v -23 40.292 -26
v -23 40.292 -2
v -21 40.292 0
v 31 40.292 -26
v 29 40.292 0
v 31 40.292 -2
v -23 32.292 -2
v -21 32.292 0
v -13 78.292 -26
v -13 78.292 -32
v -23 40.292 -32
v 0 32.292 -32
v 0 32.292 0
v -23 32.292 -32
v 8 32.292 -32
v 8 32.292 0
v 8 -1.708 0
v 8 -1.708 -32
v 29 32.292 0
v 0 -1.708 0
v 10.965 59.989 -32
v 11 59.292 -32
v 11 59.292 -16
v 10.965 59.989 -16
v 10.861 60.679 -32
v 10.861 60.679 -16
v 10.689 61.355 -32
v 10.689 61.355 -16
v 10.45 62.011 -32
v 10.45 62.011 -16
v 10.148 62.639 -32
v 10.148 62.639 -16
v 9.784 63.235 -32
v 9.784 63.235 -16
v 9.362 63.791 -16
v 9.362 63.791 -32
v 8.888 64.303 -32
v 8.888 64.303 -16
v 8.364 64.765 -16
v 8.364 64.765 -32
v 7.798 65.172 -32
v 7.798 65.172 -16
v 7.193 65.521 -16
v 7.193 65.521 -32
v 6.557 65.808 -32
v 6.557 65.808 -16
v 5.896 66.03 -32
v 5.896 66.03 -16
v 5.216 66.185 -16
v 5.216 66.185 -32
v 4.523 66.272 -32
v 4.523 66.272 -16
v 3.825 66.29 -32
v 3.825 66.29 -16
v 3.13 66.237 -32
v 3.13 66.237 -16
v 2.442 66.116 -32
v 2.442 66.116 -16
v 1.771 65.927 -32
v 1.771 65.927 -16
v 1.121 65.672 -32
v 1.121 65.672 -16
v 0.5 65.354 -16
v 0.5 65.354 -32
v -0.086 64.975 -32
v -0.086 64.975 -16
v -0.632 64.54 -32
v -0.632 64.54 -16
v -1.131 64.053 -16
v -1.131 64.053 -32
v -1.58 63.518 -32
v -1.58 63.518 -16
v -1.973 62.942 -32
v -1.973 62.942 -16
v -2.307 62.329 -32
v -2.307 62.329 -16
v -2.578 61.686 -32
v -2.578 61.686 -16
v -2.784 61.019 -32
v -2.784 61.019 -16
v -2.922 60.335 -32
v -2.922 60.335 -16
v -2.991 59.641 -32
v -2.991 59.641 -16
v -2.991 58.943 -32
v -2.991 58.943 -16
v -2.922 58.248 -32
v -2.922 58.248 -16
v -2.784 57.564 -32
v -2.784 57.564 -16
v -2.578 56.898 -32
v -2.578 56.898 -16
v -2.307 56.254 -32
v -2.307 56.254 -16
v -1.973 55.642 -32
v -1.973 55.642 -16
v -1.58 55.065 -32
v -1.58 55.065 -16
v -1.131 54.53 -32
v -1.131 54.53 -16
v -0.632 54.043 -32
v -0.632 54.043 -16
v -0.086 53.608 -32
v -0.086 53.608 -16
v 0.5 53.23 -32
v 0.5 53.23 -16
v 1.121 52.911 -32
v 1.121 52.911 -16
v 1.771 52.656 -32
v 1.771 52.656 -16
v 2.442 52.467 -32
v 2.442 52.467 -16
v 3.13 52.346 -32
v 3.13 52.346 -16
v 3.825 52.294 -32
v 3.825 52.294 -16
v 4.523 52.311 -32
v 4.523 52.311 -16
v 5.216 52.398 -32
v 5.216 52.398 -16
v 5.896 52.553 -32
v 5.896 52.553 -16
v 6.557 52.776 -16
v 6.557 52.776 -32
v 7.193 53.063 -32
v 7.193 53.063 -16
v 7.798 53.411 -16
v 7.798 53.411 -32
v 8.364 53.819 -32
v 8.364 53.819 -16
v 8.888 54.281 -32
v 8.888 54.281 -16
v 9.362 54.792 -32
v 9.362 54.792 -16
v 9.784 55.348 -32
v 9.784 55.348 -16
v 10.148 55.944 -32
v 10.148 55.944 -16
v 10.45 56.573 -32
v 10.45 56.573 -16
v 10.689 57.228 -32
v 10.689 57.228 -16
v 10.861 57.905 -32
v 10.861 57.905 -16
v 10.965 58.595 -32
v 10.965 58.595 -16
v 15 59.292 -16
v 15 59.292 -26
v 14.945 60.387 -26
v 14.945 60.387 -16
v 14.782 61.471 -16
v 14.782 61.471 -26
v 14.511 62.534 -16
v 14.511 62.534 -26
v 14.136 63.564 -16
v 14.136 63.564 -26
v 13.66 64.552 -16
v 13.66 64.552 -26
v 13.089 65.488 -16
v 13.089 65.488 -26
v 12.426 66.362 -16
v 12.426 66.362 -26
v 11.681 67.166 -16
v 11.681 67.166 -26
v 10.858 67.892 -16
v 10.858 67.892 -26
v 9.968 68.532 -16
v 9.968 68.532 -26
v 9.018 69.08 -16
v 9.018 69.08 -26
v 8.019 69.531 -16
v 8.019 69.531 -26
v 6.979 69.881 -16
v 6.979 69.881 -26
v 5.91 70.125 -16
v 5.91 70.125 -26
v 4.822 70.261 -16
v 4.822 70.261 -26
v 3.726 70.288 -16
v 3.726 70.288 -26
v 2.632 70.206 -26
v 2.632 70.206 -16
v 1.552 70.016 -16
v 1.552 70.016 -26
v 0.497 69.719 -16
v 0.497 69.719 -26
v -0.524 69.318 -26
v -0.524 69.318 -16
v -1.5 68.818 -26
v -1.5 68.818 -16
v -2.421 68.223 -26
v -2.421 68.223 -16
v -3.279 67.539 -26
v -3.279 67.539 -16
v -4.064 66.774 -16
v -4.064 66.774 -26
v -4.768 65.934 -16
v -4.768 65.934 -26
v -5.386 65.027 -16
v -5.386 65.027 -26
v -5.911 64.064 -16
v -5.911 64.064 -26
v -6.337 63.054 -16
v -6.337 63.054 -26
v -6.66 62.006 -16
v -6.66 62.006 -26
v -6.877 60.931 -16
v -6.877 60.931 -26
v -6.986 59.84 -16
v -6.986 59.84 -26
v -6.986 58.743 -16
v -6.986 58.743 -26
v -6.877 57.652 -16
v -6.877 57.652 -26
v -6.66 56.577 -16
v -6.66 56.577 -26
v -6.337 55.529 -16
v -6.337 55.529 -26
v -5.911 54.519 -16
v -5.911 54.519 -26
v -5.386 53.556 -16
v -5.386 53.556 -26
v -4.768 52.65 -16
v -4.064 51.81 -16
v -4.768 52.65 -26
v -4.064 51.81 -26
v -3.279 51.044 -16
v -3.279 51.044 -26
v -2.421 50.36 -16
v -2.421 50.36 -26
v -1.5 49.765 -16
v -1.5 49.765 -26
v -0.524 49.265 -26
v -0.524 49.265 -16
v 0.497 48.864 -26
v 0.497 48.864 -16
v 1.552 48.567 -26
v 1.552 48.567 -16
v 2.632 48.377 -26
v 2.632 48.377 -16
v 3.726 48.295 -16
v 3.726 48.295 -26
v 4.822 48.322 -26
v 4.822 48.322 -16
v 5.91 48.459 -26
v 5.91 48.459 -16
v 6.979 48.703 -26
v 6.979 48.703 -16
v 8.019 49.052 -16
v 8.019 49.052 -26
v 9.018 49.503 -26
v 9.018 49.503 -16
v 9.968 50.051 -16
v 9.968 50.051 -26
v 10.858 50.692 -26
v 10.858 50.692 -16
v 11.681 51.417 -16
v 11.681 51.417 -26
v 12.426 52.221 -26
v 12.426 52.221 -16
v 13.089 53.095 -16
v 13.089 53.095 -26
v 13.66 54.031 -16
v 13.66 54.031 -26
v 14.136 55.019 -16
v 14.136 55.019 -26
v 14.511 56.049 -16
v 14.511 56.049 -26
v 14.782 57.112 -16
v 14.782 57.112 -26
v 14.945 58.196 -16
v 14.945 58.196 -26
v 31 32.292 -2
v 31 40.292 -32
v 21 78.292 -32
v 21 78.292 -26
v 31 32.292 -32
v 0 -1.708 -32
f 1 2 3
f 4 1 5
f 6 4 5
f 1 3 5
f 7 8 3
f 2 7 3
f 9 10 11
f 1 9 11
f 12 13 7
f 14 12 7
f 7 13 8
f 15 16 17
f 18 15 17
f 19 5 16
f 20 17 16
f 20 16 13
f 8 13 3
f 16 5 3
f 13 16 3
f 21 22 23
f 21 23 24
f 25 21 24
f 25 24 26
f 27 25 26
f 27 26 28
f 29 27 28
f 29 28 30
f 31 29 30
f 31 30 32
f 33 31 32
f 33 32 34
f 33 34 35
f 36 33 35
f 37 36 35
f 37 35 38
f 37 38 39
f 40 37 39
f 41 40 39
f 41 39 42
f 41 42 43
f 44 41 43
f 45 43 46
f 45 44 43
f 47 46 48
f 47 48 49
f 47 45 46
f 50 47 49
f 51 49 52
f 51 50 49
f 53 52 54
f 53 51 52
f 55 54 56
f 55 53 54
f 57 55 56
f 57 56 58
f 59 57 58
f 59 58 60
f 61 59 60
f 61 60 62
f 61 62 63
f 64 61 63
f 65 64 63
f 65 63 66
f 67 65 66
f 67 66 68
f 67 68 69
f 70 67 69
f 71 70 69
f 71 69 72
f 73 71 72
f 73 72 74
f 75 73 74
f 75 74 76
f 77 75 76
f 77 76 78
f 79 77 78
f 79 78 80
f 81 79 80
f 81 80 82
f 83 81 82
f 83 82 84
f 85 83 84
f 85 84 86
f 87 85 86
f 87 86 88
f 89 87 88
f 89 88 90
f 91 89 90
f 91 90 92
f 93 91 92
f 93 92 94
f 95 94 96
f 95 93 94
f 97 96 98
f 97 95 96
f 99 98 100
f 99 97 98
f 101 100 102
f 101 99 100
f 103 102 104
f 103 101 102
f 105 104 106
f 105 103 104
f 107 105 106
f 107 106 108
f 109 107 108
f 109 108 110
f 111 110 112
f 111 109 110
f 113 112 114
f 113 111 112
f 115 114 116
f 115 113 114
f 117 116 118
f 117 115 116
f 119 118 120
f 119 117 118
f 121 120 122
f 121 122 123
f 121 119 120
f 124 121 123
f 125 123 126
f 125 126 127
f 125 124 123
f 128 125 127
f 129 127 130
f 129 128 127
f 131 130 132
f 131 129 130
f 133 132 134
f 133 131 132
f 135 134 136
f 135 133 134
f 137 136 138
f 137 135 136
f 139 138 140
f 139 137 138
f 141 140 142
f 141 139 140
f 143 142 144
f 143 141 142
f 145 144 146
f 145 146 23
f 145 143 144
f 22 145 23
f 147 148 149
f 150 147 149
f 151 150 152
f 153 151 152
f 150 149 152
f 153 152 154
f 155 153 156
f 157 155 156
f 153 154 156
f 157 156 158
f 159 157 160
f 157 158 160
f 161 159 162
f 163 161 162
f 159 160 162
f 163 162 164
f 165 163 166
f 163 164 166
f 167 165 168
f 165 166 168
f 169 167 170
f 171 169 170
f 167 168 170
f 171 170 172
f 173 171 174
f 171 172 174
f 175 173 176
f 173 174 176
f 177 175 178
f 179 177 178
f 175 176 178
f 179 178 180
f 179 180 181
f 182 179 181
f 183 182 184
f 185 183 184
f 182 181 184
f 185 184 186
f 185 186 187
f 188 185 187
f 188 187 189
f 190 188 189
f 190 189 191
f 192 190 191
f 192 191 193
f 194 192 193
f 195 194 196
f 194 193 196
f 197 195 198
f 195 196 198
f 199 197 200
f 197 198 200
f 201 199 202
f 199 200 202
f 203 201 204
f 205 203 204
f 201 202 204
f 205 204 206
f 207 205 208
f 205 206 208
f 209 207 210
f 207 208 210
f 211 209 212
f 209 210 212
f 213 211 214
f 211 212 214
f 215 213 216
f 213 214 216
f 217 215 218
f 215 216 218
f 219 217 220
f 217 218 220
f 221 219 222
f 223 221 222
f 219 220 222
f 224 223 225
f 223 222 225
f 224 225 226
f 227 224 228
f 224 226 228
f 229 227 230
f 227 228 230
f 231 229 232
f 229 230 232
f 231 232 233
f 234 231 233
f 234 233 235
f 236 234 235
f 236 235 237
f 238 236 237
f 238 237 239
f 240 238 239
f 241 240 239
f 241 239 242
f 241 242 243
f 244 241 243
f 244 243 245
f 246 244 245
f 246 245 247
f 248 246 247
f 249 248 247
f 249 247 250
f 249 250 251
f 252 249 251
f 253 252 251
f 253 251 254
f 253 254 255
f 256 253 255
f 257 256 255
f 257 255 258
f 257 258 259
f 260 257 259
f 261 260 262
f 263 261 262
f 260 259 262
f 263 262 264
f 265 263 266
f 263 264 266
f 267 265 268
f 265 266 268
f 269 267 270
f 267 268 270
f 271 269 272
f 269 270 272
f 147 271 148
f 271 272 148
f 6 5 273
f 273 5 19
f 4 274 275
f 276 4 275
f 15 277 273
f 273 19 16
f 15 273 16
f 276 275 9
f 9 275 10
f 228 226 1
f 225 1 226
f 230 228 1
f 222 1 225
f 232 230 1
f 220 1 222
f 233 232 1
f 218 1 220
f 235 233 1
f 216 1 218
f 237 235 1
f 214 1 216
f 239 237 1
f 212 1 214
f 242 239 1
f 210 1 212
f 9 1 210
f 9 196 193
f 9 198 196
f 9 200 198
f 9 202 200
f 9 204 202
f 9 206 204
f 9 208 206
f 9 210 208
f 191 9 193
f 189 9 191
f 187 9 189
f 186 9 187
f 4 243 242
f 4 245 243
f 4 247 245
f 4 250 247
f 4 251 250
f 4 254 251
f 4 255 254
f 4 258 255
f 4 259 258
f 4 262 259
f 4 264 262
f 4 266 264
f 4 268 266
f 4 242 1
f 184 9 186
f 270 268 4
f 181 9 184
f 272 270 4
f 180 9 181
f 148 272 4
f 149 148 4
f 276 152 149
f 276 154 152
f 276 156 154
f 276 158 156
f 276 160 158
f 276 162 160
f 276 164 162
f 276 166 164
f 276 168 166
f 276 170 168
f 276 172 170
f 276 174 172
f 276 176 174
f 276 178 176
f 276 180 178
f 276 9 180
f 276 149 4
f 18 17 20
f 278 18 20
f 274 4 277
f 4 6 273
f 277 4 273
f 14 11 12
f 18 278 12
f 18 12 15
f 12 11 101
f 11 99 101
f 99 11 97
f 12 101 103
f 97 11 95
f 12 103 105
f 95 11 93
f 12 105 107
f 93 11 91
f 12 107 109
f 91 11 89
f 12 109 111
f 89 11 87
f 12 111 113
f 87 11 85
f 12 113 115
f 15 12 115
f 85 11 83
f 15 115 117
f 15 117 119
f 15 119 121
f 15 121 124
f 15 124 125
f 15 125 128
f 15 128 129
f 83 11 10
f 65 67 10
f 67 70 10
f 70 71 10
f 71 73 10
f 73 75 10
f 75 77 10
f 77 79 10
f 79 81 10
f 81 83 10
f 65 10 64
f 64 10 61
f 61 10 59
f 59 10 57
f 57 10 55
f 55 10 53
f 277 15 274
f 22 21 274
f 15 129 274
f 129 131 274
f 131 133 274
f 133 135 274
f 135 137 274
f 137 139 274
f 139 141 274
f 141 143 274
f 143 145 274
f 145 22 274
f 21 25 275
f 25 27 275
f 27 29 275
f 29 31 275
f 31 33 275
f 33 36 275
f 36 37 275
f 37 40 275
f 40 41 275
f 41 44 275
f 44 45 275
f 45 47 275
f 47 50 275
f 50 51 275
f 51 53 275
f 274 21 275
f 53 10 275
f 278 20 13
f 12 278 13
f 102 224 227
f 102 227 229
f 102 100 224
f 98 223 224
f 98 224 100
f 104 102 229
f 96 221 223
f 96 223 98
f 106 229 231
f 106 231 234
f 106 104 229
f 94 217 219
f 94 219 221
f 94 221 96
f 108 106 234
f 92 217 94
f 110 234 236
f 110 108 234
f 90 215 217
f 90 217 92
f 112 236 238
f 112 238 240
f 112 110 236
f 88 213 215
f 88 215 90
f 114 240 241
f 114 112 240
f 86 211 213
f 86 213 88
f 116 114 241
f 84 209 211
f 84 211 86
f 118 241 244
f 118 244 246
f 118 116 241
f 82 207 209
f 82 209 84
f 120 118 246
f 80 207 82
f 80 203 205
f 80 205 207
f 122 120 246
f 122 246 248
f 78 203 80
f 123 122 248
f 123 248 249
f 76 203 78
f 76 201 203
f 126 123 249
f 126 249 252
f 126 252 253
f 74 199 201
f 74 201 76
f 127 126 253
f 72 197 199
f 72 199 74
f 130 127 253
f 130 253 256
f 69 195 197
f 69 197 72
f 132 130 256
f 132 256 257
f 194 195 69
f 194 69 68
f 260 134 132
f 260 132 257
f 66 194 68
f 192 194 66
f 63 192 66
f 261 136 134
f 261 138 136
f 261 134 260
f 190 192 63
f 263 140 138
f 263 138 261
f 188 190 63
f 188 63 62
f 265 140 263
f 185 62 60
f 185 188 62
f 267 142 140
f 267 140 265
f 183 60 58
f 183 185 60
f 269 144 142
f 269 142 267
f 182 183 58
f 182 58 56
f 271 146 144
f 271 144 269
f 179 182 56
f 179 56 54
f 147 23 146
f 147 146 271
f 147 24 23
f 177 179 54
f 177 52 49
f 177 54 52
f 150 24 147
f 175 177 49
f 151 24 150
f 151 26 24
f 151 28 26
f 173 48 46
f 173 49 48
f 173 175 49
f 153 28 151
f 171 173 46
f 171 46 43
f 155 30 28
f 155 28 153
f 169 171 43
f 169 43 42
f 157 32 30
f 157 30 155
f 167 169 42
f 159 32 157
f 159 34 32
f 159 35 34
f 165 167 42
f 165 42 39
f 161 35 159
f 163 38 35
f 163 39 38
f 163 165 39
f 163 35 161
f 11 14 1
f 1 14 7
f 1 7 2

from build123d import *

# Parameters (mm, degrees)
BOSS_EXTRUDE1_DEPTH = 32
CHAMFER1_SIZE       = 2
BOSS_EXTRUDE2_DEPTH = 6
SKETCH11_R          = 11
SKETCH11_R_2        = 7
BOSS_EXTRUDE3_DEPTH = 10
CUT_EXTRUDE1_START  = -6
SKETCH14_R          = 7
CUT_EXTRUDE1_DEPTH  = 6


with BuildPart() as part:
    # Sketch1 → Boss-Extrude1 (new body)
    with BuildSketch(Plane.XY):
        Polygon((0, -1.708319116), (0, 32.291680884), (-23, 32.291680884), (-23, 40.291680884), (31, 40.291680884), (31, 32.291680884), (8, 32.291680884), (8, -1.708319116), align=None)
    extrude(amount=-BOSS_EXTRUDE1_DEPTH)

    # Chamfer1
    chamfer1_edges = [part.edges().sort_by_distance(p)[0] for p in [
        (-23, 36.291680884, 0),
        (31, 36.291680884, 0),
    ]]
    chamfer(chamfer1_edges, length=CHAMFER1_SIZE)

    # Sketch5 → Boss-Extrude2 (add)
    with BuildSketch(Plane(origin=(0, 0, -32), x_dir=(-1, 0, 0), z_dir=(0, 0, -1))):
        Polygon((23, 40.291680884), (-31, 40.291680884), (-21, 78.291680884), (13, 78.291680884), align=None)
    extrude(amount=-BOSS_EXTRUDE2_DEPTH)

    # Sketch11 → Boss-Extrude3 (add)
    with BuildSketch(Plane.XY.offset(-26)):
        with Locations((4, 59.291680884)):
            Circle(SKETCH11_R)
        with Locations((4, 59.291680884)):
            Circle(SKETCH11_R_2, mode=Mode.SUBTRACT)
    extrude(amount=BOSS_EXTRUDE3_DEPTH)

    # Sketch14 → Cut-Extrude1 (cut)
    with BuildSketch(Plane.XY.offset(-26).offset(CUT_EXTRUDE1_START)):
        with Locations((4, 59.291680884)):
            Circle(SKETCH14_R)
    extrude(amount=CUT_EXTRUDE1_DEPTH, mode=Mode.SUBTRACT)


solid = part.part
